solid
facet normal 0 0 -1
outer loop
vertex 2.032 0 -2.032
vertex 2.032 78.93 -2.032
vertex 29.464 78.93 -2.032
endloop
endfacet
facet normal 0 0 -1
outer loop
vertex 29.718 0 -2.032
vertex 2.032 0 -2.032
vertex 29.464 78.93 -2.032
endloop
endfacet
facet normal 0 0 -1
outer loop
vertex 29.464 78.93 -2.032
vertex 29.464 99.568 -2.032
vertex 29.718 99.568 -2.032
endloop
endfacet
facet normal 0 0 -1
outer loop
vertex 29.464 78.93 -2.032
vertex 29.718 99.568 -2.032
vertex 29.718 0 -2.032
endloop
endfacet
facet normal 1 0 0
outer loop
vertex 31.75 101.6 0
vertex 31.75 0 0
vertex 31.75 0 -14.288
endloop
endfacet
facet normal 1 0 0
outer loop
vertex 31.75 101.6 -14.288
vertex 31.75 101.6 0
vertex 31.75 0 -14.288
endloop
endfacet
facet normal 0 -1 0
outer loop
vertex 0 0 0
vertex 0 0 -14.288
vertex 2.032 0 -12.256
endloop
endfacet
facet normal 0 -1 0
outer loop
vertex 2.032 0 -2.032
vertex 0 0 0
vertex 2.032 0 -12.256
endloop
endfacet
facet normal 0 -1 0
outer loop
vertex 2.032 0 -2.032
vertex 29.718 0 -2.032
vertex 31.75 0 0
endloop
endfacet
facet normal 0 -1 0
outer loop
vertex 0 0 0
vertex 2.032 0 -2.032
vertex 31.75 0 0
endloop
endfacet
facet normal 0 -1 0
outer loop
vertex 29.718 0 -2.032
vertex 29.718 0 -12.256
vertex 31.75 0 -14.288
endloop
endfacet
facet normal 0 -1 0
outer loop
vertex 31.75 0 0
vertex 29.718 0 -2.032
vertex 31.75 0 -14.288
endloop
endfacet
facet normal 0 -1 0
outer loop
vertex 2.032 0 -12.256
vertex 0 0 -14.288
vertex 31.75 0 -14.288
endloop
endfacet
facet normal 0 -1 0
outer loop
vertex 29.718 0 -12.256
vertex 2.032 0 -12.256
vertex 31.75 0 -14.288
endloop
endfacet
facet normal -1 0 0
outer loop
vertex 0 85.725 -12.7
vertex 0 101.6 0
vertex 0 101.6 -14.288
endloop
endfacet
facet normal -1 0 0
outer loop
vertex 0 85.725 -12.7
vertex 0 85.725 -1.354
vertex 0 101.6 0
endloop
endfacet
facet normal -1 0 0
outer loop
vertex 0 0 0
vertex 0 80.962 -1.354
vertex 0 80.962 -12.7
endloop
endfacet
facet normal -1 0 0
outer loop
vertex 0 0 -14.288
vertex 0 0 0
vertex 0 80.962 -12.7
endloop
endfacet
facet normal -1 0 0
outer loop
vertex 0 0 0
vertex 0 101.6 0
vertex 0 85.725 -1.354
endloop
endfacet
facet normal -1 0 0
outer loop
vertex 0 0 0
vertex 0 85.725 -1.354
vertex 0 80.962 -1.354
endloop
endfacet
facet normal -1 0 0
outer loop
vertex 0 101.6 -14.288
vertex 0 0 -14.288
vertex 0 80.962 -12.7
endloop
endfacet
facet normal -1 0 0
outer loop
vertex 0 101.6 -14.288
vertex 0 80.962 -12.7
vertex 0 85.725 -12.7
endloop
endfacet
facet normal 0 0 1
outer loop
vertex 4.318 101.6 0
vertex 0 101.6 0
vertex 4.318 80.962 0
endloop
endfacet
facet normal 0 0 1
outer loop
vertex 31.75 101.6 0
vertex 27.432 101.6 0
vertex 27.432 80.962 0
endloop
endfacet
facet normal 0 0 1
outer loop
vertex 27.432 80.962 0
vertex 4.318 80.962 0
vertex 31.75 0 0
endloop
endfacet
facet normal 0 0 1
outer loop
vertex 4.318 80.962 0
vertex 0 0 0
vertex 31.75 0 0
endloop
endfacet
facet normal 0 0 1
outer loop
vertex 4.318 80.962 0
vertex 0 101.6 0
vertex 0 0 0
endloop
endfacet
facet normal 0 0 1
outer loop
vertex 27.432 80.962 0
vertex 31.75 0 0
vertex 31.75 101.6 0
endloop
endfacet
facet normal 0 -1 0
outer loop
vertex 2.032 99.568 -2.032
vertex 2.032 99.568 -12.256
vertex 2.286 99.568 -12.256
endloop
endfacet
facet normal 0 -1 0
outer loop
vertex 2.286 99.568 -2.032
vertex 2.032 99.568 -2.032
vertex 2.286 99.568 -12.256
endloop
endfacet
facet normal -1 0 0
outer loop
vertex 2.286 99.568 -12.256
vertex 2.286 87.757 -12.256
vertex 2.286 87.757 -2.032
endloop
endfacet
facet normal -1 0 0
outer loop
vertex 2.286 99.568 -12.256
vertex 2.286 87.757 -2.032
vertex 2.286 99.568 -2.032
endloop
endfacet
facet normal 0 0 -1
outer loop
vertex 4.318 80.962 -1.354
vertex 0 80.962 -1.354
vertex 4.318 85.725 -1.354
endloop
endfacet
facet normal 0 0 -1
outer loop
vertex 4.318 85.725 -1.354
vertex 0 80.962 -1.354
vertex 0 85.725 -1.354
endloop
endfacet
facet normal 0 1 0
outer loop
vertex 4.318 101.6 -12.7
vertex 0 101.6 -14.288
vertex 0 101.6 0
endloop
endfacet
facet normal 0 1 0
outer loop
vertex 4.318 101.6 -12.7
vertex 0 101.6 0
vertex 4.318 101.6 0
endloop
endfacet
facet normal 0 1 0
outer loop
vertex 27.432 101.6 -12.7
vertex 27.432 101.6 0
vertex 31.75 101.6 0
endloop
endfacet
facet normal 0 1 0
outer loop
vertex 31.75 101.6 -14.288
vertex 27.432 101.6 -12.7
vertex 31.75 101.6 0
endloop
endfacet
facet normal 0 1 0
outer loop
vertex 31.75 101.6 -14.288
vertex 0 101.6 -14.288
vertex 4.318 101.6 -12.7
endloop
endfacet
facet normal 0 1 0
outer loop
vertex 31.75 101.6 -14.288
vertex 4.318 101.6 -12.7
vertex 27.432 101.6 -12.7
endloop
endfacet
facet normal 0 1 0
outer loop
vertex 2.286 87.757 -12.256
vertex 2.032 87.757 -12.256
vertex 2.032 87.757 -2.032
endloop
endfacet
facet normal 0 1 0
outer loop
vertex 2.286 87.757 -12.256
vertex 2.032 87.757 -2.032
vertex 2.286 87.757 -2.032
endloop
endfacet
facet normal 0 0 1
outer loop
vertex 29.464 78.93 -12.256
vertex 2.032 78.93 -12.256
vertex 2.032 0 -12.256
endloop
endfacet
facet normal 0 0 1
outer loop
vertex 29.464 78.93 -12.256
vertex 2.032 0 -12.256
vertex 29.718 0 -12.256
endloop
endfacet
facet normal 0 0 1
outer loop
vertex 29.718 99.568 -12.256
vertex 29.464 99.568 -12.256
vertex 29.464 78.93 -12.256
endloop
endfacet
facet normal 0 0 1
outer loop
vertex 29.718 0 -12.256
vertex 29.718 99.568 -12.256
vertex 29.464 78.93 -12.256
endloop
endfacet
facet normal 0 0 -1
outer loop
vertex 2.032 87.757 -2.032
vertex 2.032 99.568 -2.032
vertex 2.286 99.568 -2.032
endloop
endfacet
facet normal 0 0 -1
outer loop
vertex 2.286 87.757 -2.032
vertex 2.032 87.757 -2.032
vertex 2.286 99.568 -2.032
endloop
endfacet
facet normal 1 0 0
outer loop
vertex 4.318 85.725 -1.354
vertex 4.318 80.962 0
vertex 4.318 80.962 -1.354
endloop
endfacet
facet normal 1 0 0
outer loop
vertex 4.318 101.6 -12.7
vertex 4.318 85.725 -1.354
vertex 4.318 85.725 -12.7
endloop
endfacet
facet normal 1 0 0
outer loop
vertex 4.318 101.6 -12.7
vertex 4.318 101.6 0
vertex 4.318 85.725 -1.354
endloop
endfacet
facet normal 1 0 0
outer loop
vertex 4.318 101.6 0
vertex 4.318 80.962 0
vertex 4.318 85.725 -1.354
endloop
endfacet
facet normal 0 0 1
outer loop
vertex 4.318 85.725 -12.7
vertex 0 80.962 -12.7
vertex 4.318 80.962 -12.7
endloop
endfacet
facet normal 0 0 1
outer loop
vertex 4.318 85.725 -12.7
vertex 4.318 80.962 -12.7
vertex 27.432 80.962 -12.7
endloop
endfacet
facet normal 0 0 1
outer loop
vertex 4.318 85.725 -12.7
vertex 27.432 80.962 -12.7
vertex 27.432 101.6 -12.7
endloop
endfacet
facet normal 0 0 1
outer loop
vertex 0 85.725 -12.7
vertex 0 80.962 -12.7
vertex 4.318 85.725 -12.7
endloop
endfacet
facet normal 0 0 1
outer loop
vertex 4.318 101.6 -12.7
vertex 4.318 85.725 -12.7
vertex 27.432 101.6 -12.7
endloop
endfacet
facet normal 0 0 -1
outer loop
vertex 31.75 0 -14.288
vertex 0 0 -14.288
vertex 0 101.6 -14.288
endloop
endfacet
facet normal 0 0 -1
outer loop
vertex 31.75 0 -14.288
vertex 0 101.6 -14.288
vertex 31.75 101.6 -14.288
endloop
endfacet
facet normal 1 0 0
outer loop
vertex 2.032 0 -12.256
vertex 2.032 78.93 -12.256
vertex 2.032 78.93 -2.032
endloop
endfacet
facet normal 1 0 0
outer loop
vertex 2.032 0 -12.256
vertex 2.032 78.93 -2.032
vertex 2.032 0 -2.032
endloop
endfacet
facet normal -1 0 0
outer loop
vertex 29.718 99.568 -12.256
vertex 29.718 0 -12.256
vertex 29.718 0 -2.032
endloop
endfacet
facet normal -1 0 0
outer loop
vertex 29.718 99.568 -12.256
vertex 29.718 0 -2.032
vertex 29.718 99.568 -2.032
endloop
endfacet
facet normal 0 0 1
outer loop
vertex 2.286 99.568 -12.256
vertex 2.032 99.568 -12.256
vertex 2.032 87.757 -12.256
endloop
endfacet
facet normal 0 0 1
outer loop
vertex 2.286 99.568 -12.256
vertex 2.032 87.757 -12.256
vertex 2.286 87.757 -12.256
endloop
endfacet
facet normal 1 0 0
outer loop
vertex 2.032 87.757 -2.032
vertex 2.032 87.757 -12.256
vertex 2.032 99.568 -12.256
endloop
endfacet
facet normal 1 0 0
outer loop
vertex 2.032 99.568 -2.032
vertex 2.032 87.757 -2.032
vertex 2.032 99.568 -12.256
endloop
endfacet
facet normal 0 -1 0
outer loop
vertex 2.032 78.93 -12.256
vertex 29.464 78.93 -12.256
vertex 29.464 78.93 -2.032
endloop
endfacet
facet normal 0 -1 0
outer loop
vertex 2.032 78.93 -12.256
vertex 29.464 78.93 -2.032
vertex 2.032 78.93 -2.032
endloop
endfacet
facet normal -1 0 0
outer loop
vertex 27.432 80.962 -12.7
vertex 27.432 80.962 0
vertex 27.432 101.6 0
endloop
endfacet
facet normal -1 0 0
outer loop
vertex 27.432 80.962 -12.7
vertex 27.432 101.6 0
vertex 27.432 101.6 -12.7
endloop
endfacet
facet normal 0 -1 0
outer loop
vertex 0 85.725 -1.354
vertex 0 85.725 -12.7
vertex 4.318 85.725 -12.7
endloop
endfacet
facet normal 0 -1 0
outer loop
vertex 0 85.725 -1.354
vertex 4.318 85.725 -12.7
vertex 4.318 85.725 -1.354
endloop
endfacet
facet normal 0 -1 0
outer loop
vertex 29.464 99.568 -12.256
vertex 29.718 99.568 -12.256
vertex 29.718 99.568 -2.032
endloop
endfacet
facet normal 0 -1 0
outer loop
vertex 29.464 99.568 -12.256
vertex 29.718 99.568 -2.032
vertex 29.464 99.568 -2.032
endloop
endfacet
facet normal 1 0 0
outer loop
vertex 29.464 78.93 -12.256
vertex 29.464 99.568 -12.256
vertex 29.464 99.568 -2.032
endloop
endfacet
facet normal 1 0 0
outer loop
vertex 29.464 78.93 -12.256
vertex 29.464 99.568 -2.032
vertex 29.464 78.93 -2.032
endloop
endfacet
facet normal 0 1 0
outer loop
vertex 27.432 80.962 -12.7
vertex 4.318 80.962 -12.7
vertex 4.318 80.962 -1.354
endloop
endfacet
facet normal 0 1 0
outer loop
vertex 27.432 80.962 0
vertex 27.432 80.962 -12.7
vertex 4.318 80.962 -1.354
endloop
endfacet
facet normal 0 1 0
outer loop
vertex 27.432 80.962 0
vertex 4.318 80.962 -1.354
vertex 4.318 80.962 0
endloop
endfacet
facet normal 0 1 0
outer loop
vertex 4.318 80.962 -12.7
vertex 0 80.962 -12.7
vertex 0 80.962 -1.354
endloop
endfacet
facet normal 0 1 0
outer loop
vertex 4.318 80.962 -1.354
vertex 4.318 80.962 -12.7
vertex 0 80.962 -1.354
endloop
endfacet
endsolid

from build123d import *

# Parameters (mm, degrees)
SKETCH1_W           = 31.75
SKETCH1_H           = 14.2875
BOSS_EXTRUDE1_DEPTH = 101.6
SKETCH5_W           = 23.114
SKETCH5_H           = 12.7
CUT_EXTRUDE2_DEPTH  = 20.6375
SKETCH6_W           = 11.345737275
SKETCH6_H           = 4.7625
CUT_EXTRUDE4_DEPTH  = 9.2075
SHELL2_START        = -12.2555
SHELL2_OUTLINE_W    = 0.254
SHELL2_OUTLINE_H    = 11.811
SHELL2_DEPTH        = 10.2235


# Read off the part's stored shape, not the designer's step: Shell2
with BuildPart() as part:
    # Sketch1 → Boss-Extrude1 (new body)
    with BuildSketch(Plane(origin=(0, 0, 0), x_dir=(1, 0, 0), z_dir=(0, 1, 0))):
        with Locations((15.875, 7.14375)):
            Rectangle(SKETCH1_W, SKETCH1_H)
    extrude(amount=BOSS_EXTRUDE1_DEPTH)

    # Sketch5 → Cut-Extrude2 (cut)
    with BuildSketch(Plane(origin=(0, 101.6, 0), x_dir=(1, 0, 0), z_dir=(0, 1, 0))):
        with Locations((15.875, 6.35)):
            Rectangle(SKETCH5_W, SKETCH5_H)
    extrude(amount=-CUT_EXTRUDE2_DEPTH, mode=Mode.SUBTRACT)

    # Sketch6 → Cut-Extrude4 (cut)
    with BuildSketch(Plane.ZY):
        with Locations((-7.027131363, 83.34375)):
            Rectangle(SKETCH6_W, SKETCH6_H)
    extrude(amount=-CUT_EXTRUDE4_DEPTH, mode=Mode.SUBTRACT)

    # Shell2 outline → Shell2 (cut)
    with BuildSketch(Plane.XY.offset(SHELL2_START)):
        Polygon((2.032, 78.9305), (2.032, 0), (29.718, 0), (29.718, 99.568), (29.464, 99.568), (29.464, 78.9305), align=None)
        with Locations((2.159, 93.6625)):
            Rectangle(SHELL2_OUTLINE_W, SHELL2_OUTLINE_H)
    extrude(amount=SHELL2_DEPTH, mode=Mode.SUBTRACT)


solid = part.part
